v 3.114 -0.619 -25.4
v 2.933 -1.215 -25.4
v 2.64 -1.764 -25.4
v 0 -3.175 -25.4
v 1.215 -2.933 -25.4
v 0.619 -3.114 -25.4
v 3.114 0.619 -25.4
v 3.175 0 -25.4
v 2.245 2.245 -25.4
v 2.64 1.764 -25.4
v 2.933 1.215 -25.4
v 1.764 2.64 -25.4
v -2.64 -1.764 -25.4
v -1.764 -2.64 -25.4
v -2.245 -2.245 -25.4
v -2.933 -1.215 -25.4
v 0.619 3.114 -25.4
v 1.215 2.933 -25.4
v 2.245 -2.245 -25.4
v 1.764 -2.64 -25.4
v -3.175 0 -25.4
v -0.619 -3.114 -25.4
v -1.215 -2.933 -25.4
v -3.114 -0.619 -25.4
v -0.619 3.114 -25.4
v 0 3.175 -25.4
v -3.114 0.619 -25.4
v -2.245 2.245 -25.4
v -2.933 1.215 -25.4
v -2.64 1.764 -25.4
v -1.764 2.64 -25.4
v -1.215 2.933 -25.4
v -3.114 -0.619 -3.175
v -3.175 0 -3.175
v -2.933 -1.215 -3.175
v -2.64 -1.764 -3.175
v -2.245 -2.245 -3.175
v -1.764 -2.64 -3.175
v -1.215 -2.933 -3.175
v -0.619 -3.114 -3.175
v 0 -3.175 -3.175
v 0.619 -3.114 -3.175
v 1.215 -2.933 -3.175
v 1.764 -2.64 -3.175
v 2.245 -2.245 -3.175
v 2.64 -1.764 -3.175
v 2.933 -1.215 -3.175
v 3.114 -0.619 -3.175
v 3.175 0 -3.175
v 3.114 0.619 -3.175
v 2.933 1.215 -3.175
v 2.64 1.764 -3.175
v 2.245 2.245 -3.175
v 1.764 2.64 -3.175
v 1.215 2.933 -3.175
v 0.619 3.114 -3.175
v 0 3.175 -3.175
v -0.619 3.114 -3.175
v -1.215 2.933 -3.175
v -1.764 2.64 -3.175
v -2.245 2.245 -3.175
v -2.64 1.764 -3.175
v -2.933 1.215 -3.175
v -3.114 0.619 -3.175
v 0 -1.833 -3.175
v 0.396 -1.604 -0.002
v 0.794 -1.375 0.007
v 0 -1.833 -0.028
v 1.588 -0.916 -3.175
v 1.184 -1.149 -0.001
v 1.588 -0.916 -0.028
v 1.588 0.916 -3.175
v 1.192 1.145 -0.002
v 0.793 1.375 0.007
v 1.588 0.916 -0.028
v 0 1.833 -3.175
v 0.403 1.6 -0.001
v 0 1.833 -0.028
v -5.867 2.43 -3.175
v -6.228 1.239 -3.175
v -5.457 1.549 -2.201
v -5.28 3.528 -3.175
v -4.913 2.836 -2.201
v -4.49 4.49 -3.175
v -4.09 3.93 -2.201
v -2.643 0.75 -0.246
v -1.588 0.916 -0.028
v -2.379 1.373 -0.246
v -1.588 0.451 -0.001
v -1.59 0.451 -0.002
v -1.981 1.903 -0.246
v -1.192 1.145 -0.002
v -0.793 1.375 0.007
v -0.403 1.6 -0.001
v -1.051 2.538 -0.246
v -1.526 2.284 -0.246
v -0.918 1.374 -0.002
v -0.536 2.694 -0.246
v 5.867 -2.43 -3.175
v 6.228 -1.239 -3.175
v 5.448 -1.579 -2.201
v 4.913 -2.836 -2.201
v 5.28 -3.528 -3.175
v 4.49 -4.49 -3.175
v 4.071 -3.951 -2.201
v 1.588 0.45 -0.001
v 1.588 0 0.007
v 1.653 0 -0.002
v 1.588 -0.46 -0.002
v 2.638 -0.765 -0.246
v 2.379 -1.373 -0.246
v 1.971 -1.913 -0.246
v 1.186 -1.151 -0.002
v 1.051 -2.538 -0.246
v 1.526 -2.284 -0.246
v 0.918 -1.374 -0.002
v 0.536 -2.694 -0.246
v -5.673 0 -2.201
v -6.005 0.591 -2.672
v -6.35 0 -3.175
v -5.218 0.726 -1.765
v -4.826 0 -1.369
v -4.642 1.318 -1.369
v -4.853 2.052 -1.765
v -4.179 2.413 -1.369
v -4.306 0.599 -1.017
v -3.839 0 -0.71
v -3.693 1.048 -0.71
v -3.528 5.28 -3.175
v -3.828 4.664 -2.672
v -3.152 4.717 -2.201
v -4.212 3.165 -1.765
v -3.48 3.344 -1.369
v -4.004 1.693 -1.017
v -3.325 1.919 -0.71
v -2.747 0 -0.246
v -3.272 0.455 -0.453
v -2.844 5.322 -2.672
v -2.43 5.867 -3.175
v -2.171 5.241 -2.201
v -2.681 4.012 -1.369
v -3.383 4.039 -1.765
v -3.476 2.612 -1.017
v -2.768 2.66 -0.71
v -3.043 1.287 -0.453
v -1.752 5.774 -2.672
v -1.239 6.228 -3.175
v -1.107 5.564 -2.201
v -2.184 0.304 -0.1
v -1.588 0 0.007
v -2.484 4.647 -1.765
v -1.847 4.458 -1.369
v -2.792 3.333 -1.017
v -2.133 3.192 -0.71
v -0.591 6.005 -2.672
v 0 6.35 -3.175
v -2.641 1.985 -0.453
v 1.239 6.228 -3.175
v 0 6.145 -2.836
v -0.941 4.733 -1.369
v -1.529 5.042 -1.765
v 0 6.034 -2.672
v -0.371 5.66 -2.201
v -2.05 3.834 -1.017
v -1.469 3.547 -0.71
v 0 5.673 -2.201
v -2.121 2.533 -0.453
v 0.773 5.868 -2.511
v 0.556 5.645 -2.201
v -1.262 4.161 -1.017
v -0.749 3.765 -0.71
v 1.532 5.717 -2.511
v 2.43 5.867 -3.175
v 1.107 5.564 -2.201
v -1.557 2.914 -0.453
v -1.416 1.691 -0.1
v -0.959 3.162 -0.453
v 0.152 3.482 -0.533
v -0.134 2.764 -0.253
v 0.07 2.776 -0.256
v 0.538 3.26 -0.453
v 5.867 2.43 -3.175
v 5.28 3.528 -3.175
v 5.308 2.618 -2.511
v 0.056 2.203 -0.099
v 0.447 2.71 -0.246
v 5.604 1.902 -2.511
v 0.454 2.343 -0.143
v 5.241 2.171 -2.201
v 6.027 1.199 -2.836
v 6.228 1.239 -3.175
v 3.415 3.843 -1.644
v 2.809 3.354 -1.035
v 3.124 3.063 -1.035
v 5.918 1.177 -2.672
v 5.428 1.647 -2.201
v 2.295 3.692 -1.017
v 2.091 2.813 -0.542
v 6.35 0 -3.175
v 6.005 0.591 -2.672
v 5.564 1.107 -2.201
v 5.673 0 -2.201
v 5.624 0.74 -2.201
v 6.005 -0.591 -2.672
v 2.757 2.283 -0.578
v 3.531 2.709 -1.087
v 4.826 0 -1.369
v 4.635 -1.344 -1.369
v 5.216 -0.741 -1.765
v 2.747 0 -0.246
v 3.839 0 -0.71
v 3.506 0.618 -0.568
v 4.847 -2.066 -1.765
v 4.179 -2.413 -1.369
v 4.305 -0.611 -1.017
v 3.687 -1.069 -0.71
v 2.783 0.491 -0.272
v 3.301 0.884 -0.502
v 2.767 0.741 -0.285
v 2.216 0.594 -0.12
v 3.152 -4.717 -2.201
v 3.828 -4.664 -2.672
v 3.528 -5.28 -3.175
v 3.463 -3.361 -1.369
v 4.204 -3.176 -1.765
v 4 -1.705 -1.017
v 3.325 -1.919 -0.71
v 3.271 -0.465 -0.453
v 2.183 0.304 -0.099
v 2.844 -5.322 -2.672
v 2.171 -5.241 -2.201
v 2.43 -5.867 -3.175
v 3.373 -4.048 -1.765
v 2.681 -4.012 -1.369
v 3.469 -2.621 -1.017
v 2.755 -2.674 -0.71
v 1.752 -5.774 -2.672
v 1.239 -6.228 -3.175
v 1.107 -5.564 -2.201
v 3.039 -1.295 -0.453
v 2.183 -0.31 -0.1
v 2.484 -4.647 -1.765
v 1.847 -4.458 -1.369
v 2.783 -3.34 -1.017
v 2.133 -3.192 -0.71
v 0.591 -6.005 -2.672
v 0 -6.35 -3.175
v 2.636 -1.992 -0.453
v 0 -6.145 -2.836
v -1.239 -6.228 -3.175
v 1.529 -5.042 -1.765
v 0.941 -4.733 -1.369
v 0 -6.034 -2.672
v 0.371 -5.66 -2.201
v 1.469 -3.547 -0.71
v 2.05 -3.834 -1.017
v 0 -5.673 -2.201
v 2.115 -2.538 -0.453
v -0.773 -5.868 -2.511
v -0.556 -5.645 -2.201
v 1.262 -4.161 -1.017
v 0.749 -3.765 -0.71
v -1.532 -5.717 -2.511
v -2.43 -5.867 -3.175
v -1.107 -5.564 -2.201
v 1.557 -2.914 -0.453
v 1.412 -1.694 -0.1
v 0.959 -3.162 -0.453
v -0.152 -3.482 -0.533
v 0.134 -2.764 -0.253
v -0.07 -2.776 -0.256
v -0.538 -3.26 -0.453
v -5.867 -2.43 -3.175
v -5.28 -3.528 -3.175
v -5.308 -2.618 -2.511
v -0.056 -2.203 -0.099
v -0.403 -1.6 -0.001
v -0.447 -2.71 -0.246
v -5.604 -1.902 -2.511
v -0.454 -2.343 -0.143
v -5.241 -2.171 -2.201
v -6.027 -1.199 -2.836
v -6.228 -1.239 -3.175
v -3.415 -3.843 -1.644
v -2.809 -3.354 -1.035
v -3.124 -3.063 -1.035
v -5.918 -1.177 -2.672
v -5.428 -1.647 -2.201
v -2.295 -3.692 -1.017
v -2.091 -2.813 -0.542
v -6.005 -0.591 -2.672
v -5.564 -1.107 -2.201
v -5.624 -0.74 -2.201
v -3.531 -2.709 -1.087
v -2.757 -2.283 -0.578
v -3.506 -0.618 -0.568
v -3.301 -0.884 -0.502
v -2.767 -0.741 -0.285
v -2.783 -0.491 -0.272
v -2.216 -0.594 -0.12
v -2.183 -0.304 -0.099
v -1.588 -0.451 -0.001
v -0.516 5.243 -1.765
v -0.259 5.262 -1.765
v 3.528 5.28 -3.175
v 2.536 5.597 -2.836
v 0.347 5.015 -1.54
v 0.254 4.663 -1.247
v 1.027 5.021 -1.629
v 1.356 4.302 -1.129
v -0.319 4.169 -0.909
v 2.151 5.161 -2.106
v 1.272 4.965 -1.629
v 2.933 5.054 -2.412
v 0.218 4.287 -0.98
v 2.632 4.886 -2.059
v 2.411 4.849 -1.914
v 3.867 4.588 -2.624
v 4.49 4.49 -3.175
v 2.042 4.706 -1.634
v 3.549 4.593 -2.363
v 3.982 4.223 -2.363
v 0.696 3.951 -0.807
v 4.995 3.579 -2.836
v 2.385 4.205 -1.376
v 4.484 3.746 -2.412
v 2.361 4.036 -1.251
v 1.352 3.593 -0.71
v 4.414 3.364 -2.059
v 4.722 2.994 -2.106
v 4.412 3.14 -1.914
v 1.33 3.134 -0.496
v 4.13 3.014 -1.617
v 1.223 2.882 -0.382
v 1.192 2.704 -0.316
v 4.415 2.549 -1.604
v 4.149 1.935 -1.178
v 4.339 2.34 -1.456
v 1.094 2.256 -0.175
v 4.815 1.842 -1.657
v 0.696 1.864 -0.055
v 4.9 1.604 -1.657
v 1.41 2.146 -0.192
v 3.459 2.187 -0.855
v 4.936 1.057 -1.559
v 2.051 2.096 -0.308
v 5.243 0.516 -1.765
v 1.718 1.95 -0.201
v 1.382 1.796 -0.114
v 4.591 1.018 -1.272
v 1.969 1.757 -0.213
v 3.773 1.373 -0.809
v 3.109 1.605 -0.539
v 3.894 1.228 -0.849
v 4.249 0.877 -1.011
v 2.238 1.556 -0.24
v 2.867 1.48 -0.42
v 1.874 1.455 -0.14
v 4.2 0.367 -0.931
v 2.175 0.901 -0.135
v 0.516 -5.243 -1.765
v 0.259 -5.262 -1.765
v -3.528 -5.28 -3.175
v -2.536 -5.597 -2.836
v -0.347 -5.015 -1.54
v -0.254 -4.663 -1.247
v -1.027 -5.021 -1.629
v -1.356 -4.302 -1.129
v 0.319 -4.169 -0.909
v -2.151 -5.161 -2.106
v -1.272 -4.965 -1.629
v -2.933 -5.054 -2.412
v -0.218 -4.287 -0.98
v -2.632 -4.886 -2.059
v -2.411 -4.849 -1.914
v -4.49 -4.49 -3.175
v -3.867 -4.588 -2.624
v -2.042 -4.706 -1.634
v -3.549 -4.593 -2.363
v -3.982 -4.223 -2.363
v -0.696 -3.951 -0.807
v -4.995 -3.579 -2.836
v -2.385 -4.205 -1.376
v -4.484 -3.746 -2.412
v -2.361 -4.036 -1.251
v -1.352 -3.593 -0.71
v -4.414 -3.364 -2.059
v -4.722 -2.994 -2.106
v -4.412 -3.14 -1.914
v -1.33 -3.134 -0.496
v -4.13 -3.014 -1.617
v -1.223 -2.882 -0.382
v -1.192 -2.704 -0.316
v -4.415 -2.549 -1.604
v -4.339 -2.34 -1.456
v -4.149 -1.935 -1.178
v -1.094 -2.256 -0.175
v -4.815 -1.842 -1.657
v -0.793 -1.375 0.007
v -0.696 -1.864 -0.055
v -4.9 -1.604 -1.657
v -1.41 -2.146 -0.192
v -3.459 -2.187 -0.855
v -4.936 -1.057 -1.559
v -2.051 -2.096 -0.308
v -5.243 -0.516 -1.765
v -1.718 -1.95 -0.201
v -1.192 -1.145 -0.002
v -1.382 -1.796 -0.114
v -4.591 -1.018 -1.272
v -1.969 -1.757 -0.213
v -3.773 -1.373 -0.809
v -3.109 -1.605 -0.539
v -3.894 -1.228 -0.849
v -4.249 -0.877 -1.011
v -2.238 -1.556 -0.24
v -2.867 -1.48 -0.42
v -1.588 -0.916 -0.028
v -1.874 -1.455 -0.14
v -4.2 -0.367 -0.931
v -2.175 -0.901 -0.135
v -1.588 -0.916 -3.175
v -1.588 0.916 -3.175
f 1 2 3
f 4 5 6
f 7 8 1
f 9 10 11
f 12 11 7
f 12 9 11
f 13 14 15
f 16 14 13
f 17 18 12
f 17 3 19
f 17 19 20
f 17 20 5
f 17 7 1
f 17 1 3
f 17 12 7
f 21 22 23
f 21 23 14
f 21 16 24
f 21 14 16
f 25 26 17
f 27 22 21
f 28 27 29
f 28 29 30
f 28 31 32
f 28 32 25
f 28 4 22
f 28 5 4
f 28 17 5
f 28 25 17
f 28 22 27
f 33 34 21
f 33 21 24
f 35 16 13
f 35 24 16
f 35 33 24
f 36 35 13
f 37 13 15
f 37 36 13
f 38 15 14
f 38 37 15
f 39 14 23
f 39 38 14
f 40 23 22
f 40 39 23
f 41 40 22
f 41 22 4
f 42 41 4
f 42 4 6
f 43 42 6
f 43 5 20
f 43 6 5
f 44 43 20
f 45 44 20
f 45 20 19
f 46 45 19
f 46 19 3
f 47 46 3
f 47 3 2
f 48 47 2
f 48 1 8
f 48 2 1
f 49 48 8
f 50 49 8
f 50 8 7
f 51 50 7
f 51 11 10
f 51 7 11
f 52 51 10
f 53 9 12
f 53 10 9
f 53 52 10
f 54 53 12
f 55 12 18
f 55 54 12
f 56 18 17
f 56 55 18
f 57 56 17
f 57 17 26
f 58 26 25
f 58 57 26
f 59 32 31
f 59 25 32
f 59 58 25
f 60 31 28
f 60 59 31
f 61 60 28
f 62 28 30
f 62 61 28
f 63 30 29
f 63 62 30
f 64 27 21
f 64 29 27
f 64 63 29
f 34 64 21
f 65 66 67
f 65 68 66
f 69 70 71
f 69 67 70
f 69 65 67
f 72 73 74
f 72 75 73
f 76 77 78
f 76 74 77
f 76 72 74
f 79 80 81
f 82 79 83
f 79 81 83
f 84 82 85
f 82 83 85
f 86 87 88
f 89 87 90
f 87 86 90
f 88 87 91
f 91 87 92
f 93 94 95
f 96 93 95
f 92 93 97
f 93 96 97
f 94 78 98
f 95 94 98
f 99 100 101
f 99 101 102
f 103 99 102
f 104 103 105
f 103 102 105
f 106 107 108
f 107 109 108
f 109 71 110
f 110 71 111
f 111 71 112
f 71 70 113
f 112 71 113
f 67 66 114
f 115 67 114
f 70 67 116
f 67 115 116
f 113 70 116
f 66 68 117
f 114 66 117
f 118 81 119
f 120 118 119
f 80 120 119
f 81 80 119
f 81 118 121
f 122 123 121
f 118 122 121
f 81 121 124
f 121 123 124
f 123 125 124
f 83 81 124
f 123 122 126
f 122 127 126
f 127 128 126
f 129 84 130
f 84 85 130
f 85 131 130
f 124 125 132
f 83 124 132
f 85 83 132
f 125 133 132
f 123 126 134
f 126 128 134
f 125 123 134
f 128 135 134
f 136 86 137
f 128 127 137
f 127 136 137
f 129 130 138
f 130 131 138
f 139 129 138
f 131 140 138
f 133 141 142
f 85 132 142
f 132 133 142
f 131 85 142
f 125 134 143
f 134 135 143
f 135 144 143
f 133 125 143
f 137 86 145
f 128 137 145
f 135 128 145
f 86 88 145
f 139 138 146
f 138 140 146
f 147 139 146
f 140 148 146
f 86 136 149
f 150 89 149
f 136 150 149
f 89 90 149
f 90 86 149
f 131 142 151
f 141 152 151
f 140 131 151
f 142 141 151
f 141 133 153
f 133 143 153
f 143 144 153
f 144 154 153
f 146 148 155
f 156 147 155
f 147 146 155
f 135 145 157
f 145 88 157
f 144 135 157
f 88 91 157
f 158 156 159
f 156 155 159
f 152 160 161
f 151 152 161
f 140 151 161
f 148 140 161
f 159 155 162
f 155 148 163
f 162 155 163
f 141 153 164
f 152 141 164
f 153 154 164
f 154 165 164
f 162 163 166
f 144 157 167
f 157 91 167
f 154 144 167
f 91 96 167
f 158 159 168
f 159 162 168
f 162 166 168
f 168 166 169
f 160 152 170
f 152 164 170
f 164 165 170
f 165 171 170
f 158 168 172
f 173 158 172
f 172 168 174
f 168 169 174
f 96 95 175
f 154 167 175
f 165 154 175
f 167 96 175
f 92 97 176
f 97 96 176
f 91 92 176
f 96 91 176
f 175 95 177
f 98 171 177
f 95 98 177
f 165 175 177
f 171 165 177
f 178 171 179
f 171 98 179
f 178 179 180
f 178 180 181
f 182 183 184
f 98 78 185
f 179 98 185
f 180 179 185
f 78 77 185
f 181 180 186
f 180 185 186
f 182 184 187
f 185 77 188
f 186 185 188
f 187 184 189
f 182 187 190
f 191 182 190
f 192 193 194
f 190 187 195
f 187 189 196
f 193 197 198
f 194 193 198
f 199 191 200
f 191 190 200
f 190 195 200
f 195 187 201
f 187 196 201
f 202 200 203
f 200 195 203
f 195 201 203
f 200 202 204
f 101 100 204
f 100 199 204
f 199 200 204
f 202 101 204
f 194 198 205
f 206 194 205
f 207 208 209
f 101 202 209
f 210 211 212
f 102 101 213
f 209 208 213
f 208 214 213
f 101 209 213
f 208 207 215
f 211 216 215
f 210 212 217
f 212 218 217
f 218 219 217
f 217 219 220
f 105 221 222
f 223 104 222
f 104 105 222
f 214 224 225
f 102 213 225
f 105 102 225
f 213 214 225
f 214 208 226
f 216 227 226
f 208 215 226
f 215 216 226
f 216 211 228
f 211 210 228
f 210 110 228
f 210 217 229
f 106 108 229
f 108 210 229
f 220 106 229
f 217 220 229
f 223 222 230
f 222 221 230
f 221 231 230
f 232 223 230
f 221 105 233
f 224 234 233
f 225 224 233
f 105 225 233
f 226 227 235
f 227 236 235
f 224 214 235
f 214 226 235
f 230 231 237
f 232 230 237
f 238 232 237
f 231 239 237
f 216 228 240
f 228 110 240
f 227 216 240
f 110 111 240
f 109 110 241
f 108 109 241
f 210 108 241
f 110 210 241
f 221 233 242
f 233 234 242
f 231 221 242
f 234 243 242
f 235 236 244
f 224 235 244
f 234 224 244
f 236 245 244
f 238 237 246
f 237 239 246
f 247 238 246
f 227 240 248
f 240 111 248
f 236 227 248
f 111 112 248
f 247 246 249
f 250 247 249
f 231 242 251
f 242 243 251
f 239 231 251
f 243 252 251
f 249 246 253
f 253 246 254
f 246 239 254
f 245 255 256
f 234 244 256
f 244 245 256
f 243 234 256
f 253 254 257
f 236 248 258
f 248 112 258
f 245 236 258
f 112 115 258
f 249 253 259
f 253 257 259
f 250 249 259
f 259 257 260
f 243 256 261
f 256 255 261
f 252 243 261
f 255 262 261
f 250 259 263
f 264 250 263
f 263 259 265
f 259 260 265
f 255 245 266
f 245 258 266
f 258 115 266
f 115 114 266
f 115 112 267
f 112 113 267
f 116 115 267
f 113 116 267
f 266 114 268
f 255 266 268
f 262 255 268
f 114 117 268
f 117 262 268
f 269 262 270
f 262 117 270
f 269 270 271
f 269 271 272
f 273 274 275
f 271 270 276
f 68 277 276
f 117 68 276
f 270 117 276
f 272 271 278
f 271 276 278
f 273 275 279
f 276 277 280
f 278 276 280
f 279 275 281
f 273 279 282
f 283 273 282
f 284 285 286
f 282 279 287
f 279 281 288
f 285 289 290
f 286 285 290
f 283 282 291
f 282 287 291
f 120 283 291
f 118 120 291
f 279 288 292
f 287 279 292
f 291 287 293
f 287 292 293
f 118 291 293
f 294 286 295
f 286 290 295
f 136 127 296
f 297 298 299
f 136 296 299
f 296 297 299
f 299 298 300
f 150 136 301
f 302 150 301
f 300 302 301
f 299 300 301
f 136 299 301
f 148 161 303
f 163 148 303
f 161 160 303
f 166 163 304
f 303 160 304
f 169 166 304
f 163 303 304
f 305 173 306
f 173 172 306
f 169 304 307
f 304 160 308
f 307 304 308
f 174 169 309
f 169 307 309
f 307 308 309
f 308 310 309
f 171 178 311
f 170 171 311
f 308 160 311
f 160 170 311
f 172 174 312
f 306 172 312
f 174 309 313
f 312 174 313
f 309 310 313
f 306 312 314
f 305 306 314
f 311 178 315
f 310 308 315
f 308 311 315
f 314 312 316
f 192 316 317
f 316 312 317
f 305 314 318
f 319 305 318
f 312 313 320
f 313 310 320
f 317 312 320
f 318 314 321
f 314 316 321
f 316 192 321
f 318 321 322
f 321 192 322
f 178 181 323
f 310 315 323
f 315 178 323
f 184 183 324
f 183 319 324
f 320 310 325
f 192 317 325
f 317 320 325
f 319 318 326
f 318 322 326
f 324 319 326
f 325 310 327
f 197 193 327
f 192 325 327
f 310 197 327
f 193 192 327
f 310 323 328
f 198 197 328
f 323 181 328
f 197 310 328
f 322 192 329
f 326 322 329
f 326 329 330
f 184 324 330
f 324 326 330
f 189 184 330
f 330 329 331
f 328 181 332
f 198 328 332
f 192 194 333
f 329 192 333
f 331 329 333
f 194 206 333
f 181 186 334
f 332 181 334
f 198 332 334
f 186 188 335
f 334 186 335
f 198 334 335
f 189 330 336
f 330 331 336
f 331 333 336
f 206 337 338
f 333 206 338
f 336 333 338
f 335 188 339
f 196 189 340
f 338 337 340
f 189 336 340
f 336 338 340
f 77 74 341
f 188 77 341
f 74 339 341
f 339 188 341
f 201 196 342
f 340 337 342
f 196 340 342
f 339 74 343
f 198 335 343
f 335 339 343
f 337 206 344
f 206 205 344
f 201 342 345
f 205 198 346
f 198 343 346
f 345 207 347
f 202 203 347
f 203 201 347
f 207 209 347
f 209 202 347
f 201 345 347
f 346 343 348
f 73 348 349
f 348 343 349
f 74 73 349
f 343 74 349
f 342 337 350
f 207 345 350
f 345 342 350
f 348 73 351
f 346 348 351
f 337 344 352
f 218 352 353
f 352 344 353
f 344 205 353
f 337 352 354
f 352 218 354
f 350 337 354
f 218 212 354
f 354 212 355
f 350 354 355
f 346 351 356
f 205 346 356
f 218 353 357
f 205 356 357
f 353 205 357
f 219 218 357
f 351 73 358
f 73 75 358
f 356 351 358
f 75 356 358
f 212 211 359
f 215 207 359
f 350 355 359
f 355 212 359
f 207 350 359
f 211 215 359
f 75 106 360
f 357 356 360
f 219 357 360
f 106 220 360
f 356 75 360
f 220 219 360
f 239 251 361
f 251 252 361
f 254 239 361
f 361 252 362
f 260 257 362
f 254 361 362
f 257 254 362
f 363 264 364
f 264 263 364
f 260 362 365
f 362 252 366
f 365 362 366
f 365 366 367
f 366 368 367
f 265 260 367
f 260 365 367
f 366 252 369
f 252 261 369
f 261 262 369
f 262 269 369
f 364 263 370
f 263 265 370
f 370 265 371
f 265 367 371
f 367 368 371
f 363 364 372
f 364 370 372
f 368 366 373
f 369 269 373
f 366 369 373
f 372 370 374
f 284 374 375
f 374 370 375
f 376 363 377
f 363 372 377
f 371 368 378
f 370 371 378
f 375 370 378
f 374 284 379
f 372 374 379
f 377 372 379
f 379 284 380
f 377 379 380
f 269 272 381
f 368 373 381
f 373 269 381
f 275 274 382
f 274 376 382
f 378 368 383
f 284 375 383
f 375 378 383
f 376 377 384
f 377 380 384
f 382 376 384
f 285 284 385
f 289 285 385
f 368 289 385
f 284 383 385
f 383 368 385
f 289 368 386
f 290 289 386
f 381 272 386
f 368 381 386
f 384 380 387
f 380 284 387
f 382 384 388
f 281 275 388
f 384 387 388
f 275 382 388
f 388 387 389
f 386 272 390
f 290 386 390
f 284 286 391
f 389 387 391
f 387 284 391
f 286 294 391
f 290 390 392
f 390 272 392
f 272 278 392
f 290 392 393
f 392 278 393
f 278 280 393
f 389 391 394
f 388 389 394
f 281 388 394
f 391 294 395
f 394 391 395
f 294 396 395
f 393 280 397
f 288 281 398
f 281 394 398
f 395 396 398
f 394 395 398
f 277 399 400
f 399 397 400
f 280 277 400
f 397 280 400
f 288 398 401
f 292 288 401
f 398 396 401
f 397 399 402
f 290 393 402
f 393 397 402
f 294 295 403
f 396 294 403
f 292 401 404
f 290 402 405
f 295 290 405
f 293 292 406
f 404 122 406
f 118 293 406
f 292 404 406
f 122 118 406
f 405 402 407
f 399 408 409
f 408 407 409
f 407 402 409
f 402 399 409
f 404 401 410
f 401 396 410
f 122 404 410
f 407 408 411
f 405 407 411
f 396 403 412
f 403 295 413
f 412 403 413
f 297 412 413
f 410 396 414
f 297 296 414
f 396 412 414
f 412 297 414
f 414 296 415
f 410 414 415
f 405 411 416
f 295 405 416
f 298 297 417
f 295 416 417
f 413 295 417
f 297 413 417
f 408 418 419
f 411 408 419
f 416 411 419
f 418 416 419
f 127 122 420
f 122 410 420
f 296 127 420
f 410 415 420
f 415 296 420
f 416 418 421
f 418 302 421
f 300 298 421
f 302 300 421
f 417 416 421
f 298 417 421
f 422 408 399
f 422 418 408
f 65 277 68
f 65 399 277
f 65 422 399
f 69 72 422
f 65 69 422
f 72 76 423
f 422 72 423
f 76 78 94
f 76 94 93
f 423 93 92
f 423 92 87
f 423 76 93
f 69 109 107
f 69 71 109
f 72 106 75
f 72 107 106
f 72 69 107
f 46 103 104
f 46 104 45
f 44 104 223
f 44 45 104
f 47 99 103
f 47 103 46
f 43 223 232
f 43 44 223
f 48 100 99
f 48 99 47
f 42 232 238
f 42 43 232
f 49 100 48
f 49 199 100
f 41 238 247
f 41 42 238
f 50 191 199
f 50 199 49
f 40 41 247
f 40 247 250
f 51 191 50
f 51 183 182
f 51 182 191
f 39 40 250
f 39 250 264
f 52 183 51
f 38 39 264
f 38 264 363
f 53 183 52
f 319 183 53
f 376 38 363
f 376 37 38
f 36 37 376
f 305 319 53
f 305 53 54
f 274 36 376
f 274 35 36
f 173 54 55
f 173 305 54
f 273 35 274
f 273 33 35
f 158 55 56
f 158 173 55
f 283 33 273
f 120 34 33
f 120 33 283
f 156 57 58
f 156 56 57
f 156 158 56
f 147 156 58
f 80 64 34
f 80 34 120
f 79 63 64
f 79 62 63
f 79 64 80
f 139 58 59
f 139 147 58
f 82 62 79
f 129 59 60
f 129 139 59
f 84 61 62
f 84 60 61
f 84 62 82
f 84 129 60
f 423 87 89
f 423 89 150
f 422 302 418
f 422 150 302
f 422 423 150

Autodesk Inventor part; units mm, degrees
ref_plane "YZ Plane" through (0, 0, 0) normal (1, 0, 0) x (0, 1, 0)
ref_plane "XZ Plane" through (0, 0, 0) normal (0, 1, 0) x (-1, 0, 0)
ref_plane "XY Plane" through (0, 0, 0) normal (0, 0, 1) x (1, 0, 0)
sketch "Sketch1" plane through (0, 0, 0) normal (0, 1, 0) x (-1, 0, 0)
  line L0 (0, 0) -> (0, -25.4)
  line L1 (0, -25.4) -> (3.175, -25.4)
  line L2 (3.175, -25.4) -> (3.175, -3.175)
  line L3 (3.175, -3.175) -> (6.35, -3.175)
  arc A0 (6.35, -3.175) -> (0, 0) centre (0.8204, -6.2968) ccw
  dimension "d0" = 25.4
  dimension "d1" = 3.175
  dimension "d2" = 22.225
  dimension "d3" = 3.175
  dimension "d4" = 6.35
revolve "Revolution1" add sketch "Sketch1" angle 360 about axis through (0, 0, 0) along (0, 0, -1)
sketch "Sketch2" plane through (0, 0, -25.4) normal (0, 0, -1) x (-1, 0, 0)
  line L0 (-1.5875, 0.9165) -> (0, 1.8331)
  line L1 (0, 1.8331) -> (1.5875, 0.9165)
  line L2 (1.5875, 0.9165) -> (1.5875, -0.9165)
  line L3 (1.5875, -0.9165) -> (0, -1.8331)
  line L4 (0, -1.8331) -> (-1.5875, -0.9165)
  line L5 (-1.5875, -0.9165) -> (-1.5875, 0.9165)
  point P0 (0, 0)
  point P1 (0, 0)
  dimension "d7" = 3.175
extrude "Extrusion1" cut sketch "Sketch2" against normal blind 31.75
sketch "Sketch3" plane through (0, 0, -25.4) normal (0, 0, -1) x (-1, 0, 0)
  line L0 (-1.5875, 0.9165) -> (0, 1.8331) projected
  line L1 (0, 1.8331) -> (1.5875, 0.9165) projected
  line L2 (1.5875, 0.9165) -> (1.5875, -0.9165) projected
  line L3 (1.5875, -0.9165) -> (0, -1.8331) projected
  line L4 (0, -1.8331) -> (-1.5875, -0.9165) projected
  line L5 (-1.5875, -0.9165) -> (-1.5875, 0.9165) projected
  point P0 (0, 0)
extrude "Extrusion2" add sketch "Sketch3" against normal blind 22.225
properties part number "14-20Bolt" material "Steel, Galvanized"
